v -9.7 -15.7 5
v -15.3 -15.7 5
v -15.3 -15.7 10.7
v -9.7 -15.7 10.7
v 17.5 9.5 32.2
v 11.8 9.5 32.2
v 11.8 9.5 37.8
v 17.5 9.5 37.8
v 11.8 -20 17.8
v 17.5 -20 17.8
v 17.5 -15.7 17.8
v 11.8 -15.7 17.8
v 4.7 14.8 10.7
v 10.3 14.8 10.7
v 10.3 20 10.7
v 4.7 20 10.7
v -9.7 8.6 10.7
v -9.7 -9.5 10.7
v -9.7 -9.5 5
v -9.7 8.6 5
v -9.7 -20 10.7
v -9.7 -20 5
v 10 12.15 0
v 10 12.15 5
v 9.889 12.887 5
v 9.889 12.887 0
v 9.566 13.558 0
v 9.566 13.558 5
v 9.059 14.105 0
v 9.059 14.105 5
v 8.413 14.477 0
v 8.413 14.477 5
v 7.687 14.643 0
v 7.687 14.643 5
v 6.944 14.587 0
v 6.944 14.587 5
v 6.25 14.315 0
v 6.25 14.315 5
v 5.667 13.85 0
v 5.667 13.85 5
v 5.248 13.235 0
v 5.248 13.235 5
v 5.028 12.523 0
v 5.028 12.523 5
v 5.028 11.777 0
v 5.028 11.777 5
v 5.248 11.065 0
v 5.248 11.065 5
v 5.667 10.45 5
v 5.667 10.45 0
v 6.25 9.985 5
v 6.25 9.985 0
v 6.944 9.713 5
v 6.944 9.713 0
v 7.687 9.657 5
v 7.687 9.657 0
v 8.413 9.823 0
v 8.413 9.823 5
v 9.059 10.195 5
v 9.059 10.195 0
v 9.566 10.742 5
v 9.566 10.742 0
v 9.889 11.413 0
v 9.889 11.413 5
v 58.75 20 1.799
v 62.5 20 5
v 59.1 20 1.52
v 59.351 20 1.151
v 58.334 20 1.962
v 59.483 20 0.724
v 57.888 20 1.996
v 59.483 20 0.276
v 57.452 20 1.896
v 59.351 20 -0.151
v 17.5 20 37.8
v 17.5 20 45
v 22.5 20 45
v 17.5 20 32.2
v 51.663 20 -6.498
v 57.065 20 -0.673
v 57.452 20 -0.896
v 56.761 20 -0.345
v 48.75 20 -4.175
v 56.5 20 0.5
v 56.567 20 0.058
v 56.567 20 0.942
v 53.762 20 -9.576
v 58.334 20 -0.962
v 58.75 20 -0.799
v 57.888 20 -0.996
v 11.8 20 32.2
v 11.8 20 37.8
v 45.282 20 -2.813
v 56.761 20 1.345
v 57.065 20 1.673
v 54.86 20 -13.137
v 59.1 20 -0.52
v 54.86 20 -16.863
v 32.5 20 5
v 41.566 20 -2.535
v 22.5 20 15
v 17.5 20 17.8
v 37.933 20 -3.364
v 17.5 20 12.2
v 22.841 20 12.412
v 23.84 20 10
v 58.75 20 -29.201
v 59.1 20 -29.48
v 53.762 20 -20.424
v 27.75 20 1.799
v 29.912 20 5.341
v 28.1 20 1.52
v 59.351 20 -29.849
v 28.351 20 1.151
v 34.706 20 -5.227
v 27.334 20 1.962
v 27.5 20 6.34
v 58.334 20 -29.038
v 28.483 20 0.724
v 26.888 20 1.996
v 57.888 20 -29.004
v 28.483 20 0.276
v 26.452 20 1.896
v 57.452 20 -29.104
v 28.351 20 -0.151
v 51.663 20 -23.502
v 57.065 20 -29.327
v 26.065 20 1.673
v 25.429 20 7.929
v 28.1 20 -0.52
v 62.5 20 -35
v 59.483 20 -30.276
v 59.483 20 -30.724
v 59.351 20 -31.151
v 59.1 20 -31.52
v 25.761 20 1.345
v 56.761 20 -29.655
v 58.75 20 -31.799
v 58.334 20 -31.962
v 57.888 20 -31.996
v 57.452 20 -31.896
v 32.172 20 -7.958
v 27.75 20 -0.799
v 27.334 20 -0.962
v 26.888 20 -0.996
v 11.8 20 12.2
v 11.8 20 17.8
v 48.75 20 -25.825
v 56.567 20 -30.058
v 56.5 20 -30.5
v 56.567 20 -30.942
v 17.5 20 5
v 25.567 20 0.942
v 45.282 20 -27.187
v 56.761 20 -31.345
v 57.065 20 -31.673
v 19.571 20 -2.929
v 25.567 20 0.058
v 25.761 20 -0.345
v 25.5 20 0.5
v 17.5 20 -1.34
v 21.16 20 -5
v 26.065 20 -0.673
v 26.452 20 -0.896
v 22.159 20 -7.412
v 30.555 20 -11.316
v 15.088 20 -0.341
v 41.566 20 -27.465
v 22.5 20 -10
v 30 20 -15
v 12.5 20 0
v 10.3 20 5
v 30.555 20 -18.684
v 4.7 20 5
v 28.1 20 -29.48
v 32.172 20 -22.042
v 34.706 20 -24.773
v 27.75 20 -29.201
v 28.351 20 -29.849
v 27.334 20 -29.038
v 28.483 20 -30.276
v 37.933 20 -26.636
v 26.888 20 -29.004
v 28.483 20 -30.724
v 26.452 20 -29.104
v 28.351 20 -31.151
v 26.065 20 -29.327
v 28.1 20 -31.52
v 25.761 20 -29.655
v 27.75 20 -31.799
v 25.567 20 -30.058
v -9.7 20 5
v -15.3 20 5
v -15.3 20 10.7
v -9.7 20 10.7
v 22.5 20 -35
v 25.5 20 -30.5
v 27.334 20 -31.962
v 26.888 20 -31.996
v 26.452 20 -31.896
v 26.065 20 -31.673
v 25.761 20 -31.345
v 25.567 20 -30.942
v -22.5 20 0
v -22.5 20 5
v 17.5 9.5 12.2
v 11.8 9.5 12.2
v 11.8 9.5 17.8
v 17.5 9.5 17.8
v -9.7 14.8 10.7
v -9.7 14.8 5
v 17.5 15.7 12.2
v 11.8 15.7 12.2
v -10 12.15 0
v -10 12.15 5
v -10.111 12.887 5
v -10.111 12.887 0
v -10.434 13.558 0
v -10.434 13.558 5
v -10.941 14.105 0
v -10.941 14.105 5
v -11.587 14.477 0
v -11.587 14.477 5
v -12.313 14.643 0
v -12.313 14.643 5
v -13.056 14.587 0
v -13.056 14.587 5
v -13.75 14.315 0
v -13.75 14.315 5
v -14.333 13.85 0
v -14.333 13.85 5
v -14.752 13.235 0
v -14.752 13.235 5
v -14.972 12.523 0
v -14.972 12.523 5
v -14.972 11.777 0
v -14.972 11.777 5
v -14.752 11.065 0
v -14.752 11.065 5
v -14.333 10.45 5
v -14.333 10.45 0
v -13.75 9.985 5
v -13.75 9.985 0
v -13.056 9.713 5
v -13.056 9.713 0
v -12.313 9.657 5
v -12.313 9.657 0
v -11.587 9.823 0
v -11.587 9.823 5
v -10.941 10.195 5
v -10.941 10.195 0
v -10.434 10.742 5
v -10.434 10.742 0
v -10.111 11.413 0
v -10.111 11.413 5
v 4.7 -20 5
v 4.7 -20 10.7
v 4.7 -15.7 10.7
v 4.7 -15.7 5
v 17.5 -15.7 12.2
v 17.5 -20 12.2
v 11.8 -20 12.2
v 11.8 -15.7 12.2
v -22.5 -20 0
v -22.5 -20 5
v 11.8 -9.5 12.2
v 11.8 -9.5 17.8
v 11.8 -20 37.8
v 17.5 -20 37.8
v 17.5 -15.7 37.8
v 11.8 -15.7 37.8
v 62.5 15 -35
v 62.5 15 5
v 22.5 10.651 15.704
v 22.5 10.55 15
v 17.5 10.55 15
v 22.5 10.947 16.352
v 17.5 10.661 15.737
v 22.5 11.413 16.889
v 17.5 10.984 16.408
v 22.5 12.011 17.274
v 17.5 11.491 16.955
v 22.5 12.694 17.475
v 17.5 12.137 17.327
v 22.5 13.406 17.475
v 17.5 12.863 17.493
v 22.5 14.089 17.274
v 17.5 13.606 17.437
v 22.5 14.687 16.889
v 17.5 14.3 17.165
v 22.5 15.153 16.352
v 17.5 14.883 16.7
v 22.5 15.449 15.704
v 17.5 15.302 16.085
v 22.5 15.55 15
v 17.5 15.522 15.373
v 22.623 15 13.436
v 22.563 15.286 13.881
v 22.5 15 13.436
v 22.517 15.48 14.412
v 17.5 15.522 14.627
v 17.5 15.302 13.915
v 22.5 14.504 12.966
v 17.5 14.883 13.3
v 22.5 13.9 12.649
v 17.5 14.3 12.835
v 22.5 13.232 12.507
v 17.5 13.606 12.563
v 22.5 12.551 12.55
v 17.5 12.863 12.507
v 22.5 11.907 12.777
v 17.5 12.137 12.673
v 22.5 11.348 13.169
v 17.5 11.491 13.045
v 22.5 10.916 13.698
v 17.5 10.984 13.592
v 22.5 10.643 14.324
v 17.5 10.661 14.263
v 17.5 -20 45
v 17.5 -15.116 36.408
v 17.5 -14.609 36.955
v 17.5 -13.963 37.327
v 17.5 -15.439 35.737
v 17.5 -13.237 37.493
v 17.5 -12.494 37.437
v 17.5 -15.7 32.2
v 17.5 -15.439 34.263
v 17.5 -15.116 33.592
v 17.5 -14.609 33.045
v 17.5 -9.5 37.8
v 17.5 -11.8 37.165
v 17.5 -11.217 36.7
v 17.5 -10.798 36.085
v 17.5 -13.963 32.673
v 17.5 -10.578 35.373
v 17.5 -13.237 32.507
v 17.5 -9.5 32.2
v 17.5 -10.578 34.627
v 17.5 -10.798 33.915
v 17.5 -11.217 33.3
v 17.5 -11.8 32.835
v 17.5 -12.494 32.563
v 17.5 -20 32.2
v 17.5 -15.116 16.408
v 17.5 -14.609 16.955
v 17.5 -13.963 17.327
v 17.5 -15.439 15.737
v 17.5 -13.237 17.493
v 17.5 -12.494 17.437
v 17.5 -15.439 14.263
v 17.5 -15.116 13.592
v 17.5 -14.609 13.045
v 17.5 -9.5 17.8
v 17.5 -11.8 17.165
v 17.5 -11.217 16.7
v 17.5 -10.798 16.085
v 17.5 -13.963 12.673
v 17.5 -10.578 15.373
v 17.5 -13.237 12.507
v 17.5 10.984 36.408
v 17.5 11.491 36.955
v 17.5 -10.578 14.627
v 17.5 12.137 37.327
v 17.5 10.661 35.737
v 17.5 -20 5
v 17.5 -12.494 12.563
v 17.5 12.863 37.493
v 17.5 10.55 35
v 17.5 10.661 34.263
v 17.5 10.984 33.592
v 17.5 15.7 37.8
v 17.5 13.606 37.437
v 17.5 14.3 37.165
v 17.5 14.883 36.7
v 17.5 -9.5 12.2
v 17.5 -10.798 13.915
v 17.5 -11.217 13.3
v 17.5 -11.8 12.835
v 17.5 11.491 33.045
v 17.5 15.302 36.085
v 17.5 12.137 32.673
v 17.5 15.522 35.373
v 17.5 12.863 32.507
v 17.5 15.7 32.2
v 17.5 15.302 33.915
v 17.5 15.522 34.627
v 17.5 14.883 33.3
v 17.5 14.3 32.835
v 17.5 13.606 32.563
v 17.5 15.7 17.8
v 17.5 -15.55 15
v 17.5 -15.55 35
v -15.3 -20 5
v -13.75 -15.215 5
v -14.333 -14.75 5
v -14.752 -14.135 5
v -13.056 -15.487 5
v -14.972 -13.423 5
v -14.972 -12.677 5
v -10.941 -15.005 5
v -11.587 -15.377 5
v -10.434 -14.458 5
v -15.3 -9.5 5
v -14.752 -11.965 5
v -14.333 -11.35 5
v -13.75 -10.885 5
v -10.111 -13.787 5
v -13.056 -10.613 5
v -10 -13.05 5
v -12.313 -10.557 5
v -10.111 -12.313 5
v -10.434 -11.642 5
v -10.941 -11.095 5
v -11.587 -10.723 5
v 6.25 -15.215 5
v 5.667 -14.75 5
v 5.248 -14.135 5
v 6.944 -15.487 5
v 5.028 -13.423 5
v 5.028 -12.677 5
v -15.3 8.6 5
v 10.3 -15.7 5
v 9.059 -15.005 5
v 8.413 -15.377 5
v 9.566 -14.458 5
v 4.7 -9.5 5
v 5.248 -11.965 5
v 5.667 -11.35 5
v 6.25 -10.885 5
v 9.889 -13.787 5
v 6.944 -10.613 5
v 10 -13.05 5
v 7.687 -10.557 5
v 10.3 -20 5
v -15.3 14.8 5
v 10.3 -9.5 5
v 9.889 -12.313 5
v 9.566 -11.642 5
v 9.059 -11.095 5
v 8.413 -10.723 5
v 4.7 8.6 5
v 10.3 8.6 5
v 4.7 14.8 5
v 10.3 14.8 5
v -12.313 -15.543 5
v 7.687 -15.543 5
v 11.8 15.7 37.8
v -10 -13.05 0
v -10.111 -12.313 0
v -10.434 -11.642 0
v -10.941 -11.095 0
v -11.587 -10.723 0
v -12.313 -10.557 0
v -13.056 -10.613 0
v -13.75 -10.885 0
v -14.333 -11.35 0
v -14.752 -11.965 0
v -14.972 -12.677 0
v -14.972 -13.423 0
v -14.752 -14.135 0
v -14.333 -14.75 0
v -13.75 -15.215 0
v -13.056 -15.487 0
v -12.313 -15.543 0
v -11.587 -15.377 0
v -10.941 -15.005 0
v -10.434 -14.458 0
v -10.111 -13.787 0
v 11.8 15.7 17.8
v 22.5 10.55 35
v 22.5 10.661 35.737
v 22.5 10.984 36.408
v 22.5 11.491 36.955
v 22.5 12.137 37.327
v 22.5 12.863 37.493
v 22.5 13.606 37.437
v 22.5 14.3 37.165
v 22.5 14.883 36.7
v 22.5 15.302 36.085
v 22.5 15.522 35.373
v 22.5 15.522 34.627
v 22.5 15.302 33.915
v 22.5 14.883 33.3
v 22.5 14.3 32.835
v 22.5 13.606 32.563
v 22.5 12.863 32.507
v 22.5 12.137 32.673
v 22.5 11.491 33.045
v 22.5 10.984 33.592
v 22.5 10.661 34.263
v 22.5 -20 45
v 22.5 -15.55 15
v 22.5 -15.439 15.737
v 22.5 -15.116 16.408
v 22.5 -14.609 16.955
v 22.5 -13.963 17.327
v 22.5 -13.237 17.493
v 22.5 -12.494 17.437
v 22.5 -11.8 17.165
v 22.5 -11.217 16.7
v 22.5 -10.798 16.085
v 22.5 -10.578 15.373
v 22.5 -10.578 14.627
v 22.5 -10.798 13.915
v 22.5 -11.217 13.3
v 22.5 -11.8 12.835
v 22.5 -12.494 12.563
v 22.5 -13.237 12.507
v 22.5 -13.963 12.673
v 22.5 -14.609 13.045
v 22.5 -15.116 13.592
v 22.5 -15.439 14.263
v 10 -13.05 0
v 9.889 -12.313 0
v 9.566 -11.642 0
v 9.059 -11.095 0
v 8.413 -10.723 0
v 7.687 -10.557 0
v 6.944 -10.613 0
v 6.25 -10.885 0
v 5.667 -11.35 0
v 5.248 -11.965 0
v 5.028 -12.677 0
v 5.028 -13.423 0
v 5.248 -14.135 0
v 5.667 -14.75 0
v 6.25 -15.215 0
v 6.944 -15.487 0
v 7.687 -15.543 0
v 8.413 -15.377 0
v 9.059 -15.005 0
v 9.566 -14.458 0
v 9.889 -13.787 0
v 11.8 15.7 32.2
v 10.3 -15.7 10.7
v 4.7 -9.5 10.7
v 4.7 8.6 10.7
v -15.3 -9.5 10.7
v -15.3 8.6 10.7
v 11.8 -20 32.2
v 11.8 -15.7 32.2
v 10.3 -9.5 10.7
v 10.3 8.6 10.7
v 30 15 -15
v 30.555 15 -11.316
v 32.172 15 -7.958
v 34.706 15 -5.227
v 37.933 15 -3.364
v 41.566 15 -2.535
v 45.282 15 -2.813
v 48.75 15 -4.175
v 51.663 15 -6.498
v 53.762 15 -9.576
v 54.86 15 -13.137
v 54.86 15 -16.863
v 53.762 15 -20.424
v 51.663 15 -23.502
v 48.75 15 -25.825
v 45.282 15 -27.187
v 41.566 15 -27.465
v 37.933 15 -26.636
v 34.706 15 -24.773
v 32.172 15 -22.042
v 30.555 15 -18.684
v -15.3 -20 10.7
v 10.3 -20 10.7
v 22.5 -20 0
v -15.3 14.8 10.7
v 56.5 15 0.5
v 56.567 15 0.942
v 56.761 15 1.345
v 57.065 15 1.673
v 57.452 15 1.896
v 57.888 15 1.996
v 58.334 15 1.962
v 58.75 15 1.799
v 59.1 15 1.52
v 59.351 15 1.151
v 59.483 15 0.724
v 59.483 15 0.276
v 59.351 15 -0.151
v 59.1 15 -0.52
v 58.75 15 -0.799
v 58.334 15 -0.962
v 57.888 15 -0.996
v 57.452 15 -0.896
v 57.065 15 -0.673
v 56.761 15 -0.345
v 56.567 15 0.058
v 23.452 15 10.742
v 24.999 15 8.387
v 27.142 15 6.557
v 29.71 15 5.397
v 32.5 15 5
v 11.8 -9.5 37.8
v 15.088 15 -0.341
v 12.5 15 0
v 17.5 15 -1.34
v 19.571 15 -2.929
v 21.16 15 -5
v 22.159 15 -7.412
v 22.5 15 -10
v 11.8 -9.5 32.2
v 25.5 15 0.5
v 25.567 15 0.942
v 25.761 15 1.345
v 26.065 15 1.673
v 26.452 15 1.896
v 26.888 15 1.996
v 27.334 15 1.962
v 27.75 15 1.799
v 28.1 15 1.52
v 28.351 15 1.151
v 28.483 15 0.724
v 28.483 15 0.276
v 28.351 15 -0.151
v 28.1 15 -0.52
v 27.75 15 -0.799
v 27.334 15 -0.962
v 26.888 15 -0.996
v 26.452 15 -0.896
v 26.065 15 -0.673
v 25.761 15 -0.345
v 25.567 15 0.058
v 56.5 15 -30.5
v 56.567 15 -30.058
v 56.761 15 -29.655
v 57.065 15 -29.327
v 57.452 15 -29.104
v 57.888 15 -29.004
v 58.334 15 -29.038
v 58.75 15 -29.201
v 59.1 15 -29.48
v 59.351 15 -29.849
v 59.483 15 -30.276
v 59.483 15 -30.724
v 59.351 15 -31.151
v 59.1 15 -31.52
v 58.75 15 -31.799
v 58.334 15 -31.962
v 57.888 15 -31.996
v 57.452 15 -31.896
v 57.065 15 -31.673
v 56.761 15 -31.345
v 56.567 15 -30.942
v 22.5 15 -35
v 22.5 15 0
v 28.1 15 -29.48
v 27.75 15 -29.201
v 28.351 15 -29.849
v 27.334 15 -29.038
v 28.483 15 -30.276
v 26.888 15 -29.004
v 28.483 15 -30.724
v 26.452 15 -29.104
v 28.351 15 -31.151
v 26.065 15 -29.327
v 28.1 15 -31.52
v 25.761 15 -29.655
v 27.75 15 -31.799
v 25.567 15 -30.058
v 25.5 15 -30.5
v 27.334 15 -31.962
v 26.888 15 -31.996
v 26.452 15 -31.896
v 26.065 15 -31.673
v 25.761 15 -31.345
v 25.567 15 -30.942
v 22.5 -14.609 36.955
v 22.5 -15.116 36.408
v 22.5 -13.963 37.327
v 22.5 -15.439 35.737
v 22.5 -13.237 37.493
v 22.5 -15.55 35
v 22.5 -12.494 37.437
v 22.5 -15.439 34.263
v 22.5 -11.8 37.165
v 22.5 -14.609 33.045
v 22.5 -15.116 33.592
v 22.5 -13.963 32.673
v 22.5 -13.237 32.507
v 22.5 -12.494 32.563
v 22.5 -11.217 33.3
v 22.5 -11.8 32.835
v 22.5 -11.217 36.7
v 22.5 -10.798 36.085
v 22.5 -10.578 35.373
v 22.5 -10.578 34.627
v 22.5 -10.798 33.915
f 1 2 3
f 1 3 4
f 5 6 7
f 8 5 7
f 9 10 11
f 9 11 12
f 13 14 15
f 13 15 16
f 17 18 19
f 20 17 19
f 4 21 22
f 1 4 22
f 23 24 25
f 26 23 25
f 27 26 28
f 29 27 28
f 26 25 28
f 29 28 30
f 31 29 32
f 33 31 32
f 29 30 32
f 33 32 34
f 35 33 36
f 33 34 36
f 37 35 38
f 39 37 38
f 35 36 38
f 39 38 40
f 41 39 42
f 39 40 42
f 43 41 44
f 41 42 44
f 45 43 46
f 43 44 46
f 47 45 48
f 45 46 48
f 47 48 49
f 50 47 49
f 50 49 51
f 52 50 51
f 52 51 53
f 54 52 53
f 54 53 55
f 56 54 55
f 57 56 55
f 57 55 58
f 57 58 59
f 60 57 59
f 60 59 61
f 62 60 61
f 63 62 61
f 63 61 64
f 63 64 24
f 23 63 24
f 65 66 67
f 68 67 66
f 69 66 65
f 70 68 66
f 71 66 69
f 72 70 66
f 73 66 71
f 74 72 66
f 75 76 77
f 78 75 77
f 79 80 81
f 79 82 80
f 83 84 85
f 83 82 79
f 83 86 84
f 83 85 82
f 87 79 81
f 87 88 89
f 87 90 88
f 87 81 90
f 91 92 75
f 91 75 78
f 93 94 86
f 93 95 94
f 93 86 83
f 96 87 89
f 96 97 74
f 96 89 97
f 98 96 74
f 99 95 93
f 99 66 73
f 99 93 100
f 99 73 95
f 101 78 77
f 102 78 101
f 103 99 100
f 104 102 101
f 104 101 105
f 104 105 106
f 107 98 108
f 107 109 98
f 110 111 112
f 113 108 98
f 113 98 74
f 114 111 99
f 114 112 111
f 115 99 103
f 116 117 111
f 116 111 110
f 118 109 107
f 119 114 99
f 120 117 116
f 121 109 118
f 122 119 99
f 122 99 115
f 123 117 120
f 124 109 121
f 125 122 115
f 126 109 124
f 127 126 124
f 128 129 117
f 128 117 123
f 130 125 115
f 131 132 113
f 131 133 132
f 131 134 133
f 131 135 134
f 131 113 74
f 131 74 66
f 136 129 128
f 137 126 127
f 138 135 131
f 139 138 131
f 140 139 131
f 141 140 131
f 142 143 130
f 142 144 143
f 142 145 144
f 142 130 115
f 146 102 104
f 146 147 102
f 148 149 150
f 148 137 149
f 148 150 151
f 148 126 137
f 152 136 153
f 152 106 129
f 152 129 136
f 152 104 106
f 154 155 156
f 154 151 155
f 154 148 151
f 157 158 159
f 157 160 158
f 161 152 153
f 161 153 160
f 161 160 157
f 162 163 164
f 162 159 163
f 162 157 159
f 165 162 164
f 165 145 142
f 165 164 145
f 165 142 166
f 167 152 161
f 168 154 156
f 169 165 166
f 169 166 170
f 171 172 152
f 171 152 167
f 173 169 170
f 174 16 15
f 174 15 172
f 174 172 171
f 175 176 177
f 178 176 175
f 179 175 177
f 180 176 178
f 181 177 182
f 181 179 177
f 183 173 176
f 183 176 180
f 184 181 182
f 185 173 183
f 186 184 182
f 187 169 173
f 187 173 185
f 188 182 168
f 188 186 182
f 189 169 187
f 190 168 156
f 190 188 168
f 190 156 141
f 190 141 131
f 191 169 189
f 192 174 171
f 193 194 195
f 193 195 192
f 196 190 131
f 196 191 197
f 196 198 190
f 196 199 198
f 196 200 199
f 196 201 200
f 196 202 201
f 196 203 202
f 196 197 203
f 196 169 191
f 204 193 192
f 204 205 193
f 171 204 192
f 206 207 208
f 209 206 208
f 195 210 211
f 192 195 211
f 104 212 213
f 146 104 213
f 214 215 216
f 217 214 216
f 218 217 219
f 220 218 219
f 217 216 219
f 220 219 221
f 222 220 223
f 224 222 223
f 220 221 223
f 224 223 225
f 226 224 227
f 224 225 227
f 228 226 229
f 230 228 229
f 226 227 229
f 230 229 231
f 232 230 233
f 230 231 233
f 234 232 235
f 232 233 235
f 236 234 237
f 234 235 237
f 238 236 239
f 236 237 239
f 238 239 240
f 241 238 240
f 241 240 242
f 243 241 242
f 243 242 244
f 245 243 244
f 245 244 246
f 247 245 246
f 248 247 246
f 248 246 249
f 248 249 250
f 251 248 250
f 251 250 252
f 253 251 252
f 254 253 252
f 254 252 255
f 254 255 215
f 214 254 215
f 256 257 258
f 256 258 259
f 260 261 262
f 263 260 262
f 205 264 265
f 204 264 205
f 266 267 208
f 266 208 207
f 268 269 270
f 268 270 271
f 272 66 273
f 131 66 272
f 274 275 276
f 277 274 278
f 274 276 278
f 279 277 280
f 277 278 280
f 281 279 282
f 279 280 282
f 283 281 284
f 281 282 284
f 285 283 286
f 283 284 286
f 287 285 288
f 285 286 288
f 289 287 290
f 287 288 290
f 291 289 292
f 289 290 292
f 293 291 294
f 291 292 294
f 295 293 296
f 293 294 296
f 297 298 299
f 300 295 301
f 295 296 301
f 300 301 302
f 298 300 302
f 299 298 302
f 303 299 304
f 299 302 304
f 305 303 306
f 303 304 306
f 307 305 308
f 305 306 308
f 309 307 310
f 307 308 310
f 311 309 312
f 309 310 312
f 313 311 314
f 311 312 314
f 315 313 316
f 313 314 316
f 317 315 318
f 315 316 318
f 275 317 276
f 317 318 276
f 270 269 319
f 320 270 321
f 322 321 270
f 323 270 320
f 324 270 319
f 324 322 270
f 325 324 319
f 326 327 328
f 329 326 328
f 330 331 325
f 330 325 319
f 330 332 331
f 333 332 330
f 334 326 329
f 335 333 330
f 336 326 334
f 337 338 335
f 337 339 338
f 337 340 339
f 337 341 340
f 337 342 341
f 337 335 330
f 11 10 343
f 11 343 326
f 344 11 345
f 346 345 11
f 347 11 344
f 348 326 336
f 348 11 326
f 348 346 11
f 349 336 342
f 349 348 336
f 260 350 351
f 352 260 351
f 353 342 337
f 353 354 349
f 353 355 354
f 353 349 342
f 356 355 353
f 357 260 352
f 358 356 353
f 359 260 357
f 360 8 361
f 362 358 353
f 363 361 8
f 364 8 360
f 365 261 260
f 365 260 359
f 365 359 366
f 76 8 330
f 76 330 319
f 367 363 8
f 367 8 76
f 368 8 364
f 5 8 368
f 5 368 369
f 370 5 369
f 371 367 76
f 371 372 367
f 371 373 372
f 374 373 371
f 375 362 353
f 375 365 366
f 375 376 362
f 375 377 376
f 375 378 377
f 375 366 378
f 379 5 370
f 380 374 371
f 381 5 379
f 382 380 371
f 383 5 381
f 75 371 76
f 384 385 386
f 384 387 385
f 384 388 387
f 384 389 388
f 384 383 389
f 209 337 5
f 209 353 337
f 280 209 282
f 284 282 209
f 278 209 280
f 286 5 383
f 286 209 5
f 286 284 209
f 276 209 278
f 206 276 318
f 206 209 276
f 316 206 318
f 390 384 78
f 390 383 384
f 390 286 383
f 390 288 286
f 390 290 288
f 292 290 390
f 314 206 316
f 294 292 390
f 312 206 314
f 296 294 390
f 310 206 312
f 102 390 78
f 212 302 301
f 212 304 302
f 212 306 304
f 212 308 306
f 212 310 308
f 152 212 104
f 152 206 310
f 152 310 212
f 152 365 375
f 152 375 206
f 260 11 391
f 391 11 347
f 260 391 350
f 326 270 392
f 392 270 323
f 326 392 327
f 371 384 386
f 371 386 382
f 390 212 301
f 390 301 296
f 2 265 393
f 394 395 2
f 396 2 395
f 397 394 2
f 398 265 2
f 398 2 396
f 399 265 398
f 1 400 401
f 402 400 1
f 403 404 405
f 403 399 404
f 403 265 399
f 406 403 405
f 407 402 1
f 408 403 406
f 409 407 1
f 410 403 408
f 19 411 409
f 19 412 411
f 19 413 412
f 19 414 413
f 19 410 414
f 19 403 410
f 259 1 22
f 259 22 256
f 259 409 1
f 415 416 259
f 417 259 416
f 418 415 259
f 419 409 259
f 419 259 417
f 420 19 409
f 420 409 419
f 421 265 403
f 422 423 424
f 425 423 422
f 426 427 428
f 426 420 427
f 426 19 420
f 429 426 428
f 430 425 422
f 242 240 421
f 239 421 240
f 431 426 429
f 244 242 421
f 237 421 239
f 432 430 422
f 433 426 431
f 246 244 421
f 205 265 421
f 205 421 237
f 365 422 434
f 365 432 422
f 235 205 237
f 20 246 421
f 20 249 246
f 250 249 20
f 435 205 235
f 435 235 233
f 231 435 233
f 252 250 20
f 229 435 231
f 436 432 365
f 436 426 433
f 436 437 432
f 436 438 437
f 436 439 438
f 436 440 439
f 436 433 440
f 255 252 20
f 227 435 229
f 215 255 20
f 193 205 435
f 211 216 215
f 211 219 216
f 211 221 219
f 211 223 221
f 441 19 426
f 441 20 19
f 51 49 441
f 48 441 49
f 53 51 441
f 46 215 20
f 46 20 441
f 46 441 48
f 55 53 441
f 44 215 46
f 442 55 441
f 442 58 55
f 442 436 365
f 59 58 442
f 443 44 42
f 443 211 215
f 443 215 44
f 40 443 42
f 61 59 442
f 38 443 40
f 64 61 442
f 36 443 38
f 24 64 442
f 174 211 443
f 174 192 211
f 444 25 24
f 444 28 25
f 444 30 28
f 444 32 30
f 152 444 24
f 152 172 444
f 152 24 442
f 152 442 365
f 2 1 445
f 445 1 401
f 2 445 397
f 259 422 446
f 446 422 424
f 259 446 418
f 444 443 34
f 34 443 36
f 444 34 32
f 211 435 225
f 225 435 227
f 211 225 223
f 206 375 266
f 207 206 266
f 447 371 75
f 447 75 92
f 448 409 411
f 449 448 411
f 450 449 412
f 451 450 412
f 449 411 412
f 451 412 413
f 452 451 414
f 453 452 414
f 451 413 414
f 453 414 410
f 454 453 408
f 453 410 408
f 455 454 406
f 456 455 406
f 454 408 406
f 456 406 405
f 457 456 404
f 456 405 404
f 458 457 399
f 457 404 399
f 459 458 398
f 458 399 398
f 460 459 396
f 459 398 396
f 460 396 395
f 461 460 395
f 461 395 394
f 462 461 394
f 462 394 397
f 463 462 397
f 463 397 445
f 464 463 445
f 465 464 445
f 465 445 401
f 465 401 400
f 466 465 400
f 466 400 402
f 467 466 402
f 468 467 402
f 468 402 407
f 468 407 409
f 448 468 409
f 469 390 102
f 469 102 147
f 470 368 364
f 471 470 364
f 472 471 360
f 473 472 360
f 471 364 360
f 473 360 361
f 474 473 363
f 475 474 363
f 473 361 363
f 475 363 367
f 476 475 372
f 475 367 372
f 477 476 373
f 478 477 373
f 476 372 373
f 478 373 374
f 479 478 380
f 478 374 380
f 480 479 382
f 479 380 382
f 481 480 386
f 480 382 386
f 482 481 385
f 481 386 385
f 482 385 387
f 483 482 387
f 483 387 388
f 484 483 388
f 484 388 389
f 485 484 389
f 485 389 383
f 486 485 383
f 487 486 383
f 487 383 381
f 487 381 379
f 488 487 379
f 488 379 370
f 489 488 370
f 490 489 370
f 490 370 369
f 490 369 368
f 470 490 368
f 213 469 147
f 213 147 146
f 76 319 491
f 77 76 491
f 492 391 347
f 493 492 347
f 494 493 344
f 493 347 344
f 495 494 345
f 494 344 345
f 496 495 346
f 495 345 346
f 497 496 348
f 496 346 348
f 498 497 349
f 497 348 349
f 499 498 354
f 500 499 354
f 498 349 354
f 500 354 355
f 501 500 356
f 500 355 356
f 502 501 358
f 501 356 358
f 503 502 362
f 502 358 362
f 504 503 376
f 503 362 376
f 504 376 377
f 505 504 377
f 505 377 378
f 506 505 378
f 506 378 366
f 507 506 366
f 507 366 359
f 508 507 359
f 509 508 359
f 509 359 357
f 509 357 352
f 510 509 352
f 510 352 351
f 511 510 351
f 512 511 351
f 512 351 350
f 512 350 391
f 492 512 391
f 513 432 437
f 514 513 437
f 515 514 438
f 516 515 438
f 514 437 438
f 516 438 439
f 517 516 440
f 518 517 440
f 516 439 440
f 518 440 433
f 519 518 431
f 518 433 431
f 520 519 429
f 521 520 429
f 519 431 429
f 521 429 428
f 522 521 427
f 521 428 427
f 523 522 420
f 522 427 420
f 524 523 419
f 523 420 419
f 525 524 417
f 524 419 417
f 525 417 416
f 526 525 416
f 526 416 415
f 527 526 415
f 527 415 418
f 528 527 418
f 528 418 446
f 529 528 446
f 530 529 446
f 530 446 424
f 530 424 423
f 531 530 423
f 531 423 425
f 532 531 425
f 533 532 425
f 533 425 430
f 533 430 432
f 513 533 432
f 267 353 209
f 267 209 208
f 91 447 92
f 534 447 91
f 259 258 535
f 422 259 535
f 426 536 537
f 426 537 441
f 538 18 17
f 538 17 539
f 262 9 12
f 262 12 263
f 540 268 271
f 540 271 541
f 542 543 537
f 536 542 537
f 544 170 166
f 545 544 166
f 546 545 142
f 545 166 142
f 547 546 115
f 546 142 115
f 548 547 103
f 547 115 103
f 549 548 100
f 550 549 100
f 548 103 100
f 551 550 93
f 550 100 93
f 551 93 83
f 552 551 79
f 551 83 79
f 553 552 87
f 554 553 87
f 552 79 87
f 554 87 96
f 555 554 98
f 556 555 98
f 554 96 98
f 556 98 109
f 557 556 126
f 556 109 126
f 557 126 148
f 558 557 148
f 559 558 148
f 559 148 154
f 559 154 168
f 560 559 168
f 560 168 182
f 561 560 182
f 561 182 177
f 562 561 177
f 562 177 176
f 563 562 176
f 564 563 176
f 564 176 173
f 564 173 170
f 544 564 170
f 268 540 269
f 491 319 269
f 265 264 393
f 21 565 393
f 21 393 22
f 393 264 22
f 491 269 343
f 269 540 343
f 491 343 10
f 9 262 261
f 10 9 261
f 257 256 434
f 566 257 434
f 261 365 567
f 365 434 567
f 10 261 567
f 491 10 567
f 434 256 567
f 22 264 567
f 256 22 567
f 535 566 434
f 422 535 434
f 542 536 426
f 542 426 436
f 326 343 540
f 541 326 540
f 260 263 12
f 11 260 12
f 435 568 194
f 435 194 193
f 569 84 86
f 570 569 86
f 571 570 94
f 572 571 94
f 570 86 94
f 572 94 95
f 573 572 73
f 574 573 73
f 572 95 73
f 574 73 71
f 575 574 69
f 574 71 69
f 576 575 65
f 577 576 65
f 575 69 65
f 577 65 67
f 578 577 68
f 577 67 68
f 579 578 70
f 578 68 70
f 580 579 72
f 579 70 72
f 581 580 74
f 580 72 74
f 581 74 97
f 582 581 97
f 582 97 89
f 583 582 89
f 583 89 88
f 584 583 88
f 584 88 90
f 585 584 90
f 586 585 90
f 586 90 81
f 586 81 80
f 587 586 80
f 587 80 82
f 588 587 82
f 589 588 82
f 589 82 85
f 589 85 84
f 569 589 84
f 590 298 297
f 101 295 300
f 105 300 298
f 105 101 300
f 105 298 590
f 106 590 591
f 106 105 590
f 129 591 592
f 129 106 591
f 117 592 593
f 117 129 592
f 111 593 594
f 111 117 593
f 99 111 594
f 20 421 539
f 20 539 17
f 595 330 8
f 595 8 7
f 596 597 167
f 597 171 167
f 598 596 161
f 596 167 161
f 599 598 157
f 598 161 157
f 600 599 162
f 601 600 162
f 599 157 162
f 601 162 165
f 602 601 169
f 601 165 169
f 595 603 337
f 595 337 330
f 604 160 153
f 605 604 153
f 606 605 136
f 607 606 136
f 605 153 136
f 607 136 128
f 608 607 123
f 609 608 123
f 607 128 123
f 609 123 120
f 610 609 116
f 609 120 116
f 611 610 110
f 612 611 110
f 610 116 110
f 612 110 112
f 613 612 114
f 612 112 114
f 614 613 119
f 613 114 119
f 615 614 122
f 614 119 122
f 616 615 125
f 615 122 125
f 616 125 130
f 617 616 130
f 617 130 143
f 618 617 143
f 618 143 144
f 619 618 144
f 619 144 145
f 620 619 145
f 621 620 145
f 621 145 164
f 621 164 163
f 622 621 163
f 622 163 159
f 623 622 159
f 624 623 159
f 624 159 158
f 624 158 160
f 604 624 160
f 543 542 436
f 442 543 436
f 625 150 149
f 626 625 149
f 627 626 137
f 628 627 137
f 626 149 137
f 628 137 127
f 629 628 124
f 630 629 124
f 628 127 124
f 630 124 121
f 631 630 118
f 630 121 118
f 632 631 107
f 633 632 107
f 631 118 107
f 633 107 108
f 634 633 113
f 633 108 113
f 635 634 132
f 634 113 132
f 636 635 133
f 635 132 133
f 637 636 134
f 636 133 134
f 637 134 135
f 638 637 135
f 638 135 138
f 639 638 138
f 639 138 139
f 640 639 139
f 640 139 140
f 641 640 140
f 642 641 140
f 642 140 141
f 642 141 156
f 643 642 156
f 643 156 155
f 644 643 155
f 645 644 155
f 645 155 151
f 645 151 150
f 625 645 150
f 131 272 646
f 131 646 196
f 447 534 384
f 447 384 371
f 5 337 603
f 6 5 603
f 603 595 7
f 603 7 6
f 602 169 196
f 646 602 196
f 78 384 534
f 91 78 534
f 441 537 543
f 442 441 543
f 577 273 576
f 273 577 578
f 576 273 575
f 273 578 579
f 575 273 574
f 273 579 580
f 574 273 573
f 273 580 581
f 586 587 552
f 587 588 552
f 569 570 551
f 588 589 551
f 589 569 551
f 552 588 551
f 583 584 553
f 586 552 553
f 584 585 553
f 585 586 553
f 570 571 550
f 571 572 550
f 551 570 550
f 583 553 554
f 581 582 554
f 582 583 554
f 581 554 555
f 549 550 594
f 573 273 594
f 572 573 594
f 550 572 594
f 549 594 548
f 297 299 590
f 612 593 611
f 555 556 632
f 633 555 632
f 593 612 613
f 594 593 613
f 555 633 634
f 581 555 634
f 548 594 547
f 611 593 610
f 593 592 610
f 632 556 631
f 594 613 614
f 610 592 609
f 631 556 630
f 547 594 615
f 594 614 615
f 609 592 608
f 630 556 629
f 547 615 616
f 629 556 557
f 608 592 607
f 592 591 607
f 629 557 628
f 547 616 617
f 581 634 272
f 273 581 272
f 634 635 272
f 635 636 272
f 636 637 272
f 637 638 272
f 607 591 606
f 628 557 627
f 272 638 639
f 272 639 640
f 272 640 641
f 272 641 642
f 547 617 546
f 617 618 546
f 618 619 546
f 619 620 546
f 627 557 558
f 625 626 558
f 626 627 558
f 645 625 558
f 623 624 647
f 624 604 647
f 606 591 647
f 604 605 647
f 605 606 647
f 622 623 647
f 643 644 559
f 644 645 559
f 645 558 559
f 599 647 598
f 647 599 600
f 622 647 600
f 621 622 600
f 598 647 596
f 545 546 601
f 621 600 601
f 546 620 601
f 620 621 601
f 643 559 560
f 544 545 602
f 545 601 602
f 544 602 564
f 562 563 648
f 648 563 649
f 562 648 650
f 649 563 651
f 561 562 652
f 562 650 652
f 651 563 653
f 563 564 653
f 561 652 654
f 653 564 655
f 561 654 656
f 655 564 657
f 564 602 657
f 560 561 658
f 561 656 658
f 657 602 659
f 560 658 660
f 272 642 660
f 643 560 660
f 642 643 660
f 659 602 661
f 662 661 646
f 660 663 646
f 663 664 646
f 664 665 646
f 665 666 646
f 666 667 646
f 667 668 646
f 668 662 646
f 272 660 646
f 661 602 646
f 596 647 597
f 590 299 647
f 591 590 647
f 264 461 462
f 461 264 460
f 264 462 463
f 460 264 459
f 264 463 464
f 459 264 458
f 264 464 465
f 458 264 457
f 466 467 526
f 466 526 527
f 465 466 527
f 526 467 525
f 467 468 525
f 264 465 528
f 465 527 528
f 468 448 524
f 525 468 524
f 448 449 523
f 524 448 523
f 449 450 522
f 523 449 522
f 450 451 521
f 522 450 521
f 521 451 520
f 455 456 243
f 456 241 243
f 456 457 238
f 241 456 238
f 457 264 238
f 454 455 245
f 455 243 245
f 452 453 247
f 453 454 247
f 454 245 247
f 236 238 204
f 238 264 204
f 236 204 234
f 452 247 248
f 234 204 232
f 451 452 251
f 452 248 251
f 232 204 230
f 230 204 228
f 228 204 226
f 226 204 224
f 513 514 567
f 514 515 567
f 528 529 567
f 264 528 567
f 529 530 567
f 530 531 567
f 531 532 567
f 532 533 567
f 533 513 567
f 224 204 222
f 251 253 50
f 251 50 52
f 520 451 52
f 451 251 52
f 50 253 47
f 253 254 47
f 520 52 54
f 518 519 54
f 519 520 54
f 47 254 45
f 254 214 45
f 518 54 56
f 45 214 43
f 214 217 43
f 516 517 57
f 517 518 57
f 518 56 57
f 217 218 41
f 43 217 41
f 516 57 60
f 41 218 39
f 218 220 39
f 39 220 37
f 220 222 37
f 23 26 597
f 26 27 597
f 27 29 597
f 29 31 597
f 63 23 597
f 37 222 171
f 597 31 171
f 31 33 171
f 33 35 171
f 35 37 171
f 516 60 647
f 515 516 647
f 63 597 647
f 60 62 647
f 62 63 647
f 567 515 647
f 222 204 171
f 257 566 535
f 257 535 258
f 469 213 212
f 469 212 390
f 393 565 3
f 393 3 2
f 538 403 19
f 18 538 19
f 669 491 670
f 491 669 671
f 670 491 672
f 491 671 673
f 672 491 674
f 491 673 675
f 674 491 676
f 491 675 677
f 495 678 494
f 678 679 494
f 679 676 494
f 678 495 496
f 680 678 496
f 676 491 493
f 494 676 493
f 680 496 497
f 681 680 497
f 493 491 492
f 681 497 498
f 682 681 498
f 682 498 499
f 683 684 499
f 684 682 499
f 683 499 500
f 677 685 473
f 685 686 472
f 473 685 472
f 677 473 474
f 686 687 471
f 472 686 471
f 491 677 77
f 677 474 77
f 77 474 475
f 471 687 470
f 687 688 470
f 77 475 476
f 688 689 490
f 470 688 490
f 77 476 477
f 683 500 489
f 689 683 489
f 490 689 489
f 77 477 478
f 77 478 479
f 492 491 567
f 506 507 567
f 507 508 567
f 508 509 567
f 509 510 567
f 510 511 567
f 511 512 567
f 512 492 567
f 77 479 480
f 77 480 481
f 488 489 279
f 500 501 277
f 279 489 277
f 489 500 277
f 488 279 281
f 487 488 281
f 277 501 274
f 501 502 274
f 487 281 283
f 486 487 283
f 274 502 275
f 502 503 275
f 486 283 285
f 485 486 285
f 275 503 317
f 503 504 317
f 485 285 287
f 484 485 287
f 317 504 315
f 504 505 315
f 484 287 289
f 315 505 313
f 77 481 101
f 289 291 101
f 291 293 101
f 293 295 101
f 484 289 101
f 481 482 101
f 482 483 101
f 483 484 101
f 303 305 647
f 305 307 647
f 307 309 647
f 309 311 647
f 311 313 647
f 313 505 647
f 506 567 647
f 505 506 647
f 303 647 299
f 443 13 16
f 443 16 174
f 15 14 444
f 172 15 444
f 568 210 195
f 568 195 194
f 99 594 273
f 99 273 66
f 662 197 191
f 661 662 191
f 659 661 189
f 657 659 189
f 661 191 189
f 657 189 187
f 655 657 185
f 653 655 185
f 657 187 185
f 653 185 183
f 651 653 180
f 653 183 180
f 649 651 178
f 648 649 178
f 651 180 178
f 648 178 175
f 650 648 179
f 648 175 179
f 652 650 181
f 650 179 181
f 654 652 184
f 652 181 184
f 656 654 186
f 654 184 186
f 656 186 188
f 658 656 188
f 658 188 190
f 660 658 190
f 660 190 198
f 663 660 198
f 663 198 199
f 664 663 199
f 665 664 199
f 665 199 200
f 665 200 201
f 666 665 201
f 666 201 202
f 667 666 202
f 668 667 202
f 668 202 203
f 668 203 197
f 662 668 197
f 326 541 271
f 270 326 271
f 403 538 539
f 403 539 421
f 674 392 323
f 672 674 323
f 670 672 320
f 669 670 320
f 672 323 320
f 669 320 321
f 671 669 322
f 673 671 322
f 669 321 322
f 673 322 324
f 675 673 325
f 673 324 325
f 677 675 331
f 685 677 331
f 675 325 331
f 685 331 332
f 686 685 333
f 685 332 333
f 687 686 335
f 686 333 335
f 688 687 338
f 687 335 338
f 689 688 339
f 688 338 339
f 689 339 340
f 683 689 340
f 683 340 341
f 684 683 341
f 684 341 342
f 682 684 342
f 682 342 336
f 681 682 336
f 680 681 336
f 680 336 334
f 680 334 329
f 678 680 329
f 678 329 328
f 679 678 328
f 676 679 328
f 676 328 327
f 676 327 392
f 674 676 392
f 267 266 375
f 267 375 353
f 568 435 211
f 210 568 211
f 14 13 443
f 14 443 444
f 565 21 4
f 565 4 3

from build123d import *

# Parameters (mm, degrees)
CROQUIS1_W              = 45
CROQUIS1_H              = 40
SALIENTE_EXTRUIR1_DEPTH = 5
CROQUIS2_W              = 5
CROQUIS2_H              = 40
SALIENTE_EXTRUIR2_DEPTH = 40
CROQUIS13_W             = 40
CROQUIS13_H             = 5
SALIENTE_EXTRUIR7_DEPTH = 40
CORTAR_EXTRUIR3_REACH   = 88.783
CROQUIS15_R             = 12.5
CORTAR_EXTRUIR4_REACH   = 88.783
CROQUIS18_R             = 1.5
CROQUIS24_W             = 5.6
CROQUIS24_H             = 5.7
CROQUIS24_W_2           = 5.7
CROQUIS24_H_2           = 5.6
SALIENTE_EXTRUIR8_DEPTH = 40
CROQUIS20_W             = 40
CROQUIS20_H             = 6.2
CORTAR_EXTRUIR5_DEPTH   = 5.7
CROQUIS21_W             = 40
CROQUIS21_H             = 6.2
CORTAR_EXTRUIR6_DEPTH   = 5.7
CORTAR_EXTRUIR7_REACH   = 68.708
CROQUIS22_R             = 2.5
CORTAR_EXTRUIR8_REACH   = 78.852
CROQUIS23_R             = 2.5
REDONDEO1_R             = 10
REDONDEO2_R             = 10


with BuildPart() as part:
    # Croquis1 → Saliente-Extruir1 (new body)
    with BuildSketch(Plane.XY):
        Rectangle(CROQUIS1_W, CROQUIS1_H)
    extrude(amount=SALIENTE_EXTRUIR1_DEPTH)

    # Croquis2 → Saliente-Extruir2 (add)
    with BuildSketch(Plane.XY.offset(5)):
        with Locations((20, 0)):
            Rectangle(CROQUIS2_W, CROQUIS2_H)
    extrude(amount=SALIENTE_EXTRUIR2_DEPTH)

    # Croquis13 → Saliente-Extruir7 (add)
    with BuildSketch(Plane(origin=(22.5, 0, 0), x_dir=(0, 0, -1), z_dir=(1, 0, 0))):
        with Locations((15, 17.5)):
            Rectangle(CROQUIS13_W, CROQUIS13_H)
    extrude(amount=SALIENTE_EXTRUIR7_DEPTH)

    # Croquis15 → Cortar-Extruir3 (cut, up to next)
    with BuildSketch(Plane(origin=(0, 20, 0), x_dir=(1, 0, 0), z_dir=(0, 1, 0)), mode=Mode.PRIVATE) as cortar_extruir3_sk1:
        with Locations(Location((42.5, 15, 0), (0, 0, 180))):
            Circle(CROQUIS15_R)
    cortar_extruir3_tool1 = extrude(cortar_extruir3_sk1.sketch, amount=-CORTAR_EXTRUIR3_REACH, mode=Mode.PRIVATE) & part.part
    add(cortar_extruir3_tool1.solids().sort_by_distance((42.5, 20, -15))[0], mode=Mode.SUBTRACT)

    # Croquis18 → Cortar-Extruir4 (cut, up to next)
    with BuildSketch(Plane(origin=(0, 20, 0), x_dir=(1, 0, 0), z_dir=(0, 1, 0)), mode=Mode.PRIVATE) as cortar_extruir4_sk1:
        with Locations(Location((27, 30.5, 0), (0, 0, 180))):
            Circle(CROQUIS18_R)
    cortar_extruir4_tool1 = extrude(cortar_extruir4_sk1.sketch, amount=-CORTAR_EXTRUIR4_REACH, mode=Mode.PRIVATE) & part.part
    # Croquis18 → Cortar-Extruir4 (cut, up to next)
    with BuildSketch(Plane(origin=(0, 20, 0), x_dir=(1, 0, 0), z_dir=(0, 1, 0)), mode=Mode.PRIVATE) as cortar_extruir4_sk2:
        with Locations(Location((58, 30.5, 0), (0, 0, 180))):
            Circle(CROQUIS18_R)
    cortar_extruir4_tool2 = extrude(cortar_extruir4_sk2.sketch, amount=-CORTAR_EXTRUIR4_REACH, mode=Mode.PRIVATE) & part.part
    # Croquis18 → Cortar-Extruir4 (cut, up to next)
    with BuildSketch(Plane(origin=(0, 20, 0), x_dir=(1, 0, 0), z_dir=(0, 1, 0)), mode=Mode.PRIVATE) as cortar_extruir4_sk3:
        with Locations(Location((58, -0.5, 0), (0, 0, 180))):
            Circle(CROQUIS18_R)
    cortar_extruir4_tool3 = extrude(cortar_extruir4_sk3.sketch, amount=-CORTAR_EXTRUIR4_REACH, mode=Mode.PRIVATE) & part.part
    # Croquis18 → Cortar-Extruir4 (cut, up to next)
    with BuildSketch(Plane(origin=(0, 20, 0), x_dir=(1, 0, 0), z_dir=(0, 1, 0)), mode=Mode.PRIVATE) as cortar_extruir4_sk4:
        with Locations(Location((27, -0.5, 0), (0, 0, 180))):
            Circle(CROQUIS18_R)
    cortar_extruir4_tool4 = extrude(cortar_extruir4_sk4.sketch, amount=-CORTAR_EXTRUIR4_REACH, mode=Mode.PRIVATE) & part.part
    add(cortar_extruir4_tool1.solids().sort_by_distance((27, 20, -30.5))[0], mode=Mode.SUBTRACT)
    add(cortar_extruir4_tool2.solids().sort_by_distance((58, 20, -30.5))[0], mode=Mode.SUBTRACT)
    add(cortar_extruir4_tool3.solids().sort_by_distance((58, 20, 0.5))[0], mode=Mode.SUBTRACT)
    add(cortar_extruir4_tool4.solids().sort_by_distance((27, 20, 0.5))[0], mode=Mode.SUBTRACT)

    # Croquis24 → Saliente-Extruir8 (add)
    with BuildSketch(Plane(origin=(0, -20, 0), x_dir=(-1, 0, 0), z_dir=(0, -1, 0))):
        with Locations((12.5, -7.85)):
            Rectangle(CROQUIS24_W, CROQUIS24_H)
        with Locations((-7.5, -7.85)):
            Rectangle(CROQUIS24_W, CROQUIS24_H)
        with Locations((-14.65, -35)):
            Rectangle(CROQUIS24_W_2, CROQUIS24_H_2)
        with Locations((-14.65, -15)):
            Rectangle(CROQUIS24_W_2, CROQUIS24_H_2)
    extrude(amount=-SALIENTE_EXTRUIR8_DEPTH)

    # Croquis20 → Cortar-Extruir5 (cut)
    with BuildSketch(Plane.ZY.offset(-11.8)):
        with Locations((25, -12.6)):
            Rectangle(CROQUIS20_W, CROQUIS20_H)
        with Locations((25, 12.6)):
            Rectangle(CROQUIS20_W, CROQUIS20_H)
    extrude(amount=-CORTAR_EXTRUIR5_DEPTH, mode=Mode.SUBTRACT)

    # Croquis21 → Cortar-Extruir6 (cut)
    with BuildSketch(Plane.XY.offset(10.7)):
        with Locations((-2.5, -12.6)):
            Rectangle(CROQUIS21_W, CROQUIS21_H)
        with Locations((-2.5, 11.7)):
            Rectangle(CROQUIS21_W, CROQUIS21_H)
    extrude(amount=-CORTAR_EXTRUIR6_DEPTH, mode=Mode.SUBTRACT)

    # Croquis22 → Cortar-Extruir7 (cut, up to next)
    with BuildSketch(Plane.ZY.offset(-17.5), mode=Mode.PRIVATE) as cortar_extruir7_sk1:
        with Locations(Location((15, 13.05, 0), (0, 0, 270))):
            Circle(CROQUIS22_R)
    cortar_extruir7_tool1 = extrude(cortar_extruir7_sk1.sketch, amount=-CORTAR_EXTRUIR7_REACH, mode=Mode.PRIVATE) & part.part
    # Croquis22 → Cortar-Extruir7 (cut, up to next)
    with BuildSketch(Plane.ZY.offset(-17.5), mode=Mode.PRIVATE) as cortar_extruir7_sk2:
        with Locations(Location((35, 13.05, 0), (0, 0, 270))):
            Circle(CROQUIS22_R)
    cortar_extruir7_tool2 = extrude(cortar_extruir7_sk2.sketch, amount=-CORTAR_EXTRUIR7_REACH, mode=Mode.PRIVATE) & part.part
    # Croquis22 → Cortar-Extruir7 (cut, up to next)
    with BuildSketch(Plane.ZY.offset(-17.5), mode=Mode.PRIVATE) as cortar_extruir7_sk3:
        with Locations(Location((15, -13.05, 0), (0, 0, 270))):
            Circle(CROQUIS22_R)
    cortar_extruir7_tool3 = extrude(cortar_extruir7_sk3.sketch, amount=-CORTAR_EXTRUIR7_REACH, mode=Mode.PRIVATE) & part.part
    # Croquis22 → Cortar-Extruir7 (cut, up to next)
    with BuildSketch(Plane.ZY.offset(-17.5), mode=Mode.PRIVATE) as cortar_extruir7_sk4:
        with Locations(Location((35, -13.05, 0), (0, 0, 270))):
            Circle(CROQUIS22_R)
    cortar_extruir7_tool4 = extrude(cortar_extruir7_sk4.sketch, amount=-CORTAR_EXTRUIR7_REACH, mode=Mode.PRIVATE) & part.part
    add(cortar_extruir7_tool1.solids().sort_by_distance((17.5, 13.05, 15))[0], mode=Mode.SUBTRACT)
    add(cortar_extruir7_tool2.solids().sort_by_distance((17.5, 13.05, 35))[0], mode=Mode.SUBTRACT)
    add(cortar_extruir7_tool3.solids().sort_by_distance((17.5, -13.05, 15))[0], mode=Mode.SUBTRACT)
    add(cortar_extruir7_tool4.solids().sort_by_distance((17.5, -13.05, 35))[0], mode=Mode.SUBTRACT)

    # Croquis23 → Cortar-Extruir8 (cut, up to next)
    with BuildSketch(Plane.XY.offset(5), mode=Mode.PRIVATE) as cortar_extruir8_sk1:
        with Locations((-12.5, 12.15)):
            Circle(CROQUIS23_R)
    cortar_extruir8_tool1 = extrude(cortar_extruir8_sk1.sketch, amount=-CORTAR_EXTRUIR8_REACH, mode=Mode.PRIVATE) & part.part
    # Croquis23 → Cortar-Extruir8 (cut, up to next)
    with BuildSketch(Plane.XY.offset(5), mode=Mode.PRIVATE) as cortar_extruir8_sk2:
        with Locations((7.5, 12.15)):
            Circle(CROQUIS23_R)
    cortar_extruir8_tool2 = extrude(cortar_extruir8_sk2.sketch, amount=-CORTAR_EXTRUIR8_REACH, mode=Mode.PRIVATE) & part.part
    # Croquis23 → Cortar-Extruir8 (cut, up to next)
    with BuildSketch(Plane.XY.offset(5), mode=Mode.PRIVATE) as cortar_extruir8_sk3:
        with Locations((-12.5, -13.05)):
            Circle(CROQUIS23_R)
    cortar_extruir8_tool3 = extrude(cortar_extruir8_sk3.sketch, amount=-CORTAR_EXTRUIR8_REACH, mode=Mode.PRIVATE) & part.part
    # Croquis23 → Cortar-Extruir8 (cut, up to next)
    with BuildSketch(Plane.XY.offset(5), mode=Mode.PRIVATE) as cortar_extruir8_sk4:
        with Locations((7.5, -13.05)):
            Circle(CROQUIS23_R)
    cortar_extruir8_tool4 = extrude(cortar_extruir8_sk4.sketch, amount=-CORTAR_EXTRUIR8_REACH, mode=Mode.PRIVATE) & part.part
    add(cortar_extruir8_tool1.solids().sort_by_distance((-12.5, 12.15, 5))[0], mode=Mode.SUBTRACT)
    add(cortar_extruir8_tool2.solids().sort_by_distance((7.5, 12.15, 5))[0], mode=Mode.SUBTRACT)
    add(cortar_extruir8_tool3.solids().sort_by_distance((-12.5, -13.05, 5))[0], mode=Mode.SUBTRACT)
    add(cortar_extruir8_tool4.solids().sort_by_distance((7.5, -13.05, 5))[0], mode=Mode.SUBTRACT)

    # Redondeo1
    # the kernel refuses this fillet: 10 mm, written as the material it adds along each edge
    with BuildSketch(Plane(origin=(22.5, 20, 5), x_dir=(0, 0, 1), z_dir=(0, -1, 0))) as redondeo1_piece_1_section:
        with BuildLine():
            CenterArc((REDONDEO1_R, -REDONDEO1_R), REDONDEO1_R, 90, 90)
            Line((0, -REDONDEO1_R), (0, 0))
            Line((0, 0), (REDONDEO1_R, 0))
        make_face()
    redondeo1_piece_1 = extrude(amount=5, mode=Mode.PRIVATE)
    redondeo1_piece_1 = redondeo1_piece_1 - Plane(origin=(24.766392733, 13.05, 15), x_dir=(0, -1, 0), z_dir=(-1, 0, 0)) * Cylinder(2.5, 50, mode=Mode.PRIVATE)
    add(redondeo1_piece_1)

    # Redondeo2
    redondeo2_edges = [part.edges().sort_by_distance(p)[0] for p in [
        (22.5, 17.5, 0),
    ]]
    fillet(redondeo2_edges, radius=REDONDEO2_R)


solid = part.part
